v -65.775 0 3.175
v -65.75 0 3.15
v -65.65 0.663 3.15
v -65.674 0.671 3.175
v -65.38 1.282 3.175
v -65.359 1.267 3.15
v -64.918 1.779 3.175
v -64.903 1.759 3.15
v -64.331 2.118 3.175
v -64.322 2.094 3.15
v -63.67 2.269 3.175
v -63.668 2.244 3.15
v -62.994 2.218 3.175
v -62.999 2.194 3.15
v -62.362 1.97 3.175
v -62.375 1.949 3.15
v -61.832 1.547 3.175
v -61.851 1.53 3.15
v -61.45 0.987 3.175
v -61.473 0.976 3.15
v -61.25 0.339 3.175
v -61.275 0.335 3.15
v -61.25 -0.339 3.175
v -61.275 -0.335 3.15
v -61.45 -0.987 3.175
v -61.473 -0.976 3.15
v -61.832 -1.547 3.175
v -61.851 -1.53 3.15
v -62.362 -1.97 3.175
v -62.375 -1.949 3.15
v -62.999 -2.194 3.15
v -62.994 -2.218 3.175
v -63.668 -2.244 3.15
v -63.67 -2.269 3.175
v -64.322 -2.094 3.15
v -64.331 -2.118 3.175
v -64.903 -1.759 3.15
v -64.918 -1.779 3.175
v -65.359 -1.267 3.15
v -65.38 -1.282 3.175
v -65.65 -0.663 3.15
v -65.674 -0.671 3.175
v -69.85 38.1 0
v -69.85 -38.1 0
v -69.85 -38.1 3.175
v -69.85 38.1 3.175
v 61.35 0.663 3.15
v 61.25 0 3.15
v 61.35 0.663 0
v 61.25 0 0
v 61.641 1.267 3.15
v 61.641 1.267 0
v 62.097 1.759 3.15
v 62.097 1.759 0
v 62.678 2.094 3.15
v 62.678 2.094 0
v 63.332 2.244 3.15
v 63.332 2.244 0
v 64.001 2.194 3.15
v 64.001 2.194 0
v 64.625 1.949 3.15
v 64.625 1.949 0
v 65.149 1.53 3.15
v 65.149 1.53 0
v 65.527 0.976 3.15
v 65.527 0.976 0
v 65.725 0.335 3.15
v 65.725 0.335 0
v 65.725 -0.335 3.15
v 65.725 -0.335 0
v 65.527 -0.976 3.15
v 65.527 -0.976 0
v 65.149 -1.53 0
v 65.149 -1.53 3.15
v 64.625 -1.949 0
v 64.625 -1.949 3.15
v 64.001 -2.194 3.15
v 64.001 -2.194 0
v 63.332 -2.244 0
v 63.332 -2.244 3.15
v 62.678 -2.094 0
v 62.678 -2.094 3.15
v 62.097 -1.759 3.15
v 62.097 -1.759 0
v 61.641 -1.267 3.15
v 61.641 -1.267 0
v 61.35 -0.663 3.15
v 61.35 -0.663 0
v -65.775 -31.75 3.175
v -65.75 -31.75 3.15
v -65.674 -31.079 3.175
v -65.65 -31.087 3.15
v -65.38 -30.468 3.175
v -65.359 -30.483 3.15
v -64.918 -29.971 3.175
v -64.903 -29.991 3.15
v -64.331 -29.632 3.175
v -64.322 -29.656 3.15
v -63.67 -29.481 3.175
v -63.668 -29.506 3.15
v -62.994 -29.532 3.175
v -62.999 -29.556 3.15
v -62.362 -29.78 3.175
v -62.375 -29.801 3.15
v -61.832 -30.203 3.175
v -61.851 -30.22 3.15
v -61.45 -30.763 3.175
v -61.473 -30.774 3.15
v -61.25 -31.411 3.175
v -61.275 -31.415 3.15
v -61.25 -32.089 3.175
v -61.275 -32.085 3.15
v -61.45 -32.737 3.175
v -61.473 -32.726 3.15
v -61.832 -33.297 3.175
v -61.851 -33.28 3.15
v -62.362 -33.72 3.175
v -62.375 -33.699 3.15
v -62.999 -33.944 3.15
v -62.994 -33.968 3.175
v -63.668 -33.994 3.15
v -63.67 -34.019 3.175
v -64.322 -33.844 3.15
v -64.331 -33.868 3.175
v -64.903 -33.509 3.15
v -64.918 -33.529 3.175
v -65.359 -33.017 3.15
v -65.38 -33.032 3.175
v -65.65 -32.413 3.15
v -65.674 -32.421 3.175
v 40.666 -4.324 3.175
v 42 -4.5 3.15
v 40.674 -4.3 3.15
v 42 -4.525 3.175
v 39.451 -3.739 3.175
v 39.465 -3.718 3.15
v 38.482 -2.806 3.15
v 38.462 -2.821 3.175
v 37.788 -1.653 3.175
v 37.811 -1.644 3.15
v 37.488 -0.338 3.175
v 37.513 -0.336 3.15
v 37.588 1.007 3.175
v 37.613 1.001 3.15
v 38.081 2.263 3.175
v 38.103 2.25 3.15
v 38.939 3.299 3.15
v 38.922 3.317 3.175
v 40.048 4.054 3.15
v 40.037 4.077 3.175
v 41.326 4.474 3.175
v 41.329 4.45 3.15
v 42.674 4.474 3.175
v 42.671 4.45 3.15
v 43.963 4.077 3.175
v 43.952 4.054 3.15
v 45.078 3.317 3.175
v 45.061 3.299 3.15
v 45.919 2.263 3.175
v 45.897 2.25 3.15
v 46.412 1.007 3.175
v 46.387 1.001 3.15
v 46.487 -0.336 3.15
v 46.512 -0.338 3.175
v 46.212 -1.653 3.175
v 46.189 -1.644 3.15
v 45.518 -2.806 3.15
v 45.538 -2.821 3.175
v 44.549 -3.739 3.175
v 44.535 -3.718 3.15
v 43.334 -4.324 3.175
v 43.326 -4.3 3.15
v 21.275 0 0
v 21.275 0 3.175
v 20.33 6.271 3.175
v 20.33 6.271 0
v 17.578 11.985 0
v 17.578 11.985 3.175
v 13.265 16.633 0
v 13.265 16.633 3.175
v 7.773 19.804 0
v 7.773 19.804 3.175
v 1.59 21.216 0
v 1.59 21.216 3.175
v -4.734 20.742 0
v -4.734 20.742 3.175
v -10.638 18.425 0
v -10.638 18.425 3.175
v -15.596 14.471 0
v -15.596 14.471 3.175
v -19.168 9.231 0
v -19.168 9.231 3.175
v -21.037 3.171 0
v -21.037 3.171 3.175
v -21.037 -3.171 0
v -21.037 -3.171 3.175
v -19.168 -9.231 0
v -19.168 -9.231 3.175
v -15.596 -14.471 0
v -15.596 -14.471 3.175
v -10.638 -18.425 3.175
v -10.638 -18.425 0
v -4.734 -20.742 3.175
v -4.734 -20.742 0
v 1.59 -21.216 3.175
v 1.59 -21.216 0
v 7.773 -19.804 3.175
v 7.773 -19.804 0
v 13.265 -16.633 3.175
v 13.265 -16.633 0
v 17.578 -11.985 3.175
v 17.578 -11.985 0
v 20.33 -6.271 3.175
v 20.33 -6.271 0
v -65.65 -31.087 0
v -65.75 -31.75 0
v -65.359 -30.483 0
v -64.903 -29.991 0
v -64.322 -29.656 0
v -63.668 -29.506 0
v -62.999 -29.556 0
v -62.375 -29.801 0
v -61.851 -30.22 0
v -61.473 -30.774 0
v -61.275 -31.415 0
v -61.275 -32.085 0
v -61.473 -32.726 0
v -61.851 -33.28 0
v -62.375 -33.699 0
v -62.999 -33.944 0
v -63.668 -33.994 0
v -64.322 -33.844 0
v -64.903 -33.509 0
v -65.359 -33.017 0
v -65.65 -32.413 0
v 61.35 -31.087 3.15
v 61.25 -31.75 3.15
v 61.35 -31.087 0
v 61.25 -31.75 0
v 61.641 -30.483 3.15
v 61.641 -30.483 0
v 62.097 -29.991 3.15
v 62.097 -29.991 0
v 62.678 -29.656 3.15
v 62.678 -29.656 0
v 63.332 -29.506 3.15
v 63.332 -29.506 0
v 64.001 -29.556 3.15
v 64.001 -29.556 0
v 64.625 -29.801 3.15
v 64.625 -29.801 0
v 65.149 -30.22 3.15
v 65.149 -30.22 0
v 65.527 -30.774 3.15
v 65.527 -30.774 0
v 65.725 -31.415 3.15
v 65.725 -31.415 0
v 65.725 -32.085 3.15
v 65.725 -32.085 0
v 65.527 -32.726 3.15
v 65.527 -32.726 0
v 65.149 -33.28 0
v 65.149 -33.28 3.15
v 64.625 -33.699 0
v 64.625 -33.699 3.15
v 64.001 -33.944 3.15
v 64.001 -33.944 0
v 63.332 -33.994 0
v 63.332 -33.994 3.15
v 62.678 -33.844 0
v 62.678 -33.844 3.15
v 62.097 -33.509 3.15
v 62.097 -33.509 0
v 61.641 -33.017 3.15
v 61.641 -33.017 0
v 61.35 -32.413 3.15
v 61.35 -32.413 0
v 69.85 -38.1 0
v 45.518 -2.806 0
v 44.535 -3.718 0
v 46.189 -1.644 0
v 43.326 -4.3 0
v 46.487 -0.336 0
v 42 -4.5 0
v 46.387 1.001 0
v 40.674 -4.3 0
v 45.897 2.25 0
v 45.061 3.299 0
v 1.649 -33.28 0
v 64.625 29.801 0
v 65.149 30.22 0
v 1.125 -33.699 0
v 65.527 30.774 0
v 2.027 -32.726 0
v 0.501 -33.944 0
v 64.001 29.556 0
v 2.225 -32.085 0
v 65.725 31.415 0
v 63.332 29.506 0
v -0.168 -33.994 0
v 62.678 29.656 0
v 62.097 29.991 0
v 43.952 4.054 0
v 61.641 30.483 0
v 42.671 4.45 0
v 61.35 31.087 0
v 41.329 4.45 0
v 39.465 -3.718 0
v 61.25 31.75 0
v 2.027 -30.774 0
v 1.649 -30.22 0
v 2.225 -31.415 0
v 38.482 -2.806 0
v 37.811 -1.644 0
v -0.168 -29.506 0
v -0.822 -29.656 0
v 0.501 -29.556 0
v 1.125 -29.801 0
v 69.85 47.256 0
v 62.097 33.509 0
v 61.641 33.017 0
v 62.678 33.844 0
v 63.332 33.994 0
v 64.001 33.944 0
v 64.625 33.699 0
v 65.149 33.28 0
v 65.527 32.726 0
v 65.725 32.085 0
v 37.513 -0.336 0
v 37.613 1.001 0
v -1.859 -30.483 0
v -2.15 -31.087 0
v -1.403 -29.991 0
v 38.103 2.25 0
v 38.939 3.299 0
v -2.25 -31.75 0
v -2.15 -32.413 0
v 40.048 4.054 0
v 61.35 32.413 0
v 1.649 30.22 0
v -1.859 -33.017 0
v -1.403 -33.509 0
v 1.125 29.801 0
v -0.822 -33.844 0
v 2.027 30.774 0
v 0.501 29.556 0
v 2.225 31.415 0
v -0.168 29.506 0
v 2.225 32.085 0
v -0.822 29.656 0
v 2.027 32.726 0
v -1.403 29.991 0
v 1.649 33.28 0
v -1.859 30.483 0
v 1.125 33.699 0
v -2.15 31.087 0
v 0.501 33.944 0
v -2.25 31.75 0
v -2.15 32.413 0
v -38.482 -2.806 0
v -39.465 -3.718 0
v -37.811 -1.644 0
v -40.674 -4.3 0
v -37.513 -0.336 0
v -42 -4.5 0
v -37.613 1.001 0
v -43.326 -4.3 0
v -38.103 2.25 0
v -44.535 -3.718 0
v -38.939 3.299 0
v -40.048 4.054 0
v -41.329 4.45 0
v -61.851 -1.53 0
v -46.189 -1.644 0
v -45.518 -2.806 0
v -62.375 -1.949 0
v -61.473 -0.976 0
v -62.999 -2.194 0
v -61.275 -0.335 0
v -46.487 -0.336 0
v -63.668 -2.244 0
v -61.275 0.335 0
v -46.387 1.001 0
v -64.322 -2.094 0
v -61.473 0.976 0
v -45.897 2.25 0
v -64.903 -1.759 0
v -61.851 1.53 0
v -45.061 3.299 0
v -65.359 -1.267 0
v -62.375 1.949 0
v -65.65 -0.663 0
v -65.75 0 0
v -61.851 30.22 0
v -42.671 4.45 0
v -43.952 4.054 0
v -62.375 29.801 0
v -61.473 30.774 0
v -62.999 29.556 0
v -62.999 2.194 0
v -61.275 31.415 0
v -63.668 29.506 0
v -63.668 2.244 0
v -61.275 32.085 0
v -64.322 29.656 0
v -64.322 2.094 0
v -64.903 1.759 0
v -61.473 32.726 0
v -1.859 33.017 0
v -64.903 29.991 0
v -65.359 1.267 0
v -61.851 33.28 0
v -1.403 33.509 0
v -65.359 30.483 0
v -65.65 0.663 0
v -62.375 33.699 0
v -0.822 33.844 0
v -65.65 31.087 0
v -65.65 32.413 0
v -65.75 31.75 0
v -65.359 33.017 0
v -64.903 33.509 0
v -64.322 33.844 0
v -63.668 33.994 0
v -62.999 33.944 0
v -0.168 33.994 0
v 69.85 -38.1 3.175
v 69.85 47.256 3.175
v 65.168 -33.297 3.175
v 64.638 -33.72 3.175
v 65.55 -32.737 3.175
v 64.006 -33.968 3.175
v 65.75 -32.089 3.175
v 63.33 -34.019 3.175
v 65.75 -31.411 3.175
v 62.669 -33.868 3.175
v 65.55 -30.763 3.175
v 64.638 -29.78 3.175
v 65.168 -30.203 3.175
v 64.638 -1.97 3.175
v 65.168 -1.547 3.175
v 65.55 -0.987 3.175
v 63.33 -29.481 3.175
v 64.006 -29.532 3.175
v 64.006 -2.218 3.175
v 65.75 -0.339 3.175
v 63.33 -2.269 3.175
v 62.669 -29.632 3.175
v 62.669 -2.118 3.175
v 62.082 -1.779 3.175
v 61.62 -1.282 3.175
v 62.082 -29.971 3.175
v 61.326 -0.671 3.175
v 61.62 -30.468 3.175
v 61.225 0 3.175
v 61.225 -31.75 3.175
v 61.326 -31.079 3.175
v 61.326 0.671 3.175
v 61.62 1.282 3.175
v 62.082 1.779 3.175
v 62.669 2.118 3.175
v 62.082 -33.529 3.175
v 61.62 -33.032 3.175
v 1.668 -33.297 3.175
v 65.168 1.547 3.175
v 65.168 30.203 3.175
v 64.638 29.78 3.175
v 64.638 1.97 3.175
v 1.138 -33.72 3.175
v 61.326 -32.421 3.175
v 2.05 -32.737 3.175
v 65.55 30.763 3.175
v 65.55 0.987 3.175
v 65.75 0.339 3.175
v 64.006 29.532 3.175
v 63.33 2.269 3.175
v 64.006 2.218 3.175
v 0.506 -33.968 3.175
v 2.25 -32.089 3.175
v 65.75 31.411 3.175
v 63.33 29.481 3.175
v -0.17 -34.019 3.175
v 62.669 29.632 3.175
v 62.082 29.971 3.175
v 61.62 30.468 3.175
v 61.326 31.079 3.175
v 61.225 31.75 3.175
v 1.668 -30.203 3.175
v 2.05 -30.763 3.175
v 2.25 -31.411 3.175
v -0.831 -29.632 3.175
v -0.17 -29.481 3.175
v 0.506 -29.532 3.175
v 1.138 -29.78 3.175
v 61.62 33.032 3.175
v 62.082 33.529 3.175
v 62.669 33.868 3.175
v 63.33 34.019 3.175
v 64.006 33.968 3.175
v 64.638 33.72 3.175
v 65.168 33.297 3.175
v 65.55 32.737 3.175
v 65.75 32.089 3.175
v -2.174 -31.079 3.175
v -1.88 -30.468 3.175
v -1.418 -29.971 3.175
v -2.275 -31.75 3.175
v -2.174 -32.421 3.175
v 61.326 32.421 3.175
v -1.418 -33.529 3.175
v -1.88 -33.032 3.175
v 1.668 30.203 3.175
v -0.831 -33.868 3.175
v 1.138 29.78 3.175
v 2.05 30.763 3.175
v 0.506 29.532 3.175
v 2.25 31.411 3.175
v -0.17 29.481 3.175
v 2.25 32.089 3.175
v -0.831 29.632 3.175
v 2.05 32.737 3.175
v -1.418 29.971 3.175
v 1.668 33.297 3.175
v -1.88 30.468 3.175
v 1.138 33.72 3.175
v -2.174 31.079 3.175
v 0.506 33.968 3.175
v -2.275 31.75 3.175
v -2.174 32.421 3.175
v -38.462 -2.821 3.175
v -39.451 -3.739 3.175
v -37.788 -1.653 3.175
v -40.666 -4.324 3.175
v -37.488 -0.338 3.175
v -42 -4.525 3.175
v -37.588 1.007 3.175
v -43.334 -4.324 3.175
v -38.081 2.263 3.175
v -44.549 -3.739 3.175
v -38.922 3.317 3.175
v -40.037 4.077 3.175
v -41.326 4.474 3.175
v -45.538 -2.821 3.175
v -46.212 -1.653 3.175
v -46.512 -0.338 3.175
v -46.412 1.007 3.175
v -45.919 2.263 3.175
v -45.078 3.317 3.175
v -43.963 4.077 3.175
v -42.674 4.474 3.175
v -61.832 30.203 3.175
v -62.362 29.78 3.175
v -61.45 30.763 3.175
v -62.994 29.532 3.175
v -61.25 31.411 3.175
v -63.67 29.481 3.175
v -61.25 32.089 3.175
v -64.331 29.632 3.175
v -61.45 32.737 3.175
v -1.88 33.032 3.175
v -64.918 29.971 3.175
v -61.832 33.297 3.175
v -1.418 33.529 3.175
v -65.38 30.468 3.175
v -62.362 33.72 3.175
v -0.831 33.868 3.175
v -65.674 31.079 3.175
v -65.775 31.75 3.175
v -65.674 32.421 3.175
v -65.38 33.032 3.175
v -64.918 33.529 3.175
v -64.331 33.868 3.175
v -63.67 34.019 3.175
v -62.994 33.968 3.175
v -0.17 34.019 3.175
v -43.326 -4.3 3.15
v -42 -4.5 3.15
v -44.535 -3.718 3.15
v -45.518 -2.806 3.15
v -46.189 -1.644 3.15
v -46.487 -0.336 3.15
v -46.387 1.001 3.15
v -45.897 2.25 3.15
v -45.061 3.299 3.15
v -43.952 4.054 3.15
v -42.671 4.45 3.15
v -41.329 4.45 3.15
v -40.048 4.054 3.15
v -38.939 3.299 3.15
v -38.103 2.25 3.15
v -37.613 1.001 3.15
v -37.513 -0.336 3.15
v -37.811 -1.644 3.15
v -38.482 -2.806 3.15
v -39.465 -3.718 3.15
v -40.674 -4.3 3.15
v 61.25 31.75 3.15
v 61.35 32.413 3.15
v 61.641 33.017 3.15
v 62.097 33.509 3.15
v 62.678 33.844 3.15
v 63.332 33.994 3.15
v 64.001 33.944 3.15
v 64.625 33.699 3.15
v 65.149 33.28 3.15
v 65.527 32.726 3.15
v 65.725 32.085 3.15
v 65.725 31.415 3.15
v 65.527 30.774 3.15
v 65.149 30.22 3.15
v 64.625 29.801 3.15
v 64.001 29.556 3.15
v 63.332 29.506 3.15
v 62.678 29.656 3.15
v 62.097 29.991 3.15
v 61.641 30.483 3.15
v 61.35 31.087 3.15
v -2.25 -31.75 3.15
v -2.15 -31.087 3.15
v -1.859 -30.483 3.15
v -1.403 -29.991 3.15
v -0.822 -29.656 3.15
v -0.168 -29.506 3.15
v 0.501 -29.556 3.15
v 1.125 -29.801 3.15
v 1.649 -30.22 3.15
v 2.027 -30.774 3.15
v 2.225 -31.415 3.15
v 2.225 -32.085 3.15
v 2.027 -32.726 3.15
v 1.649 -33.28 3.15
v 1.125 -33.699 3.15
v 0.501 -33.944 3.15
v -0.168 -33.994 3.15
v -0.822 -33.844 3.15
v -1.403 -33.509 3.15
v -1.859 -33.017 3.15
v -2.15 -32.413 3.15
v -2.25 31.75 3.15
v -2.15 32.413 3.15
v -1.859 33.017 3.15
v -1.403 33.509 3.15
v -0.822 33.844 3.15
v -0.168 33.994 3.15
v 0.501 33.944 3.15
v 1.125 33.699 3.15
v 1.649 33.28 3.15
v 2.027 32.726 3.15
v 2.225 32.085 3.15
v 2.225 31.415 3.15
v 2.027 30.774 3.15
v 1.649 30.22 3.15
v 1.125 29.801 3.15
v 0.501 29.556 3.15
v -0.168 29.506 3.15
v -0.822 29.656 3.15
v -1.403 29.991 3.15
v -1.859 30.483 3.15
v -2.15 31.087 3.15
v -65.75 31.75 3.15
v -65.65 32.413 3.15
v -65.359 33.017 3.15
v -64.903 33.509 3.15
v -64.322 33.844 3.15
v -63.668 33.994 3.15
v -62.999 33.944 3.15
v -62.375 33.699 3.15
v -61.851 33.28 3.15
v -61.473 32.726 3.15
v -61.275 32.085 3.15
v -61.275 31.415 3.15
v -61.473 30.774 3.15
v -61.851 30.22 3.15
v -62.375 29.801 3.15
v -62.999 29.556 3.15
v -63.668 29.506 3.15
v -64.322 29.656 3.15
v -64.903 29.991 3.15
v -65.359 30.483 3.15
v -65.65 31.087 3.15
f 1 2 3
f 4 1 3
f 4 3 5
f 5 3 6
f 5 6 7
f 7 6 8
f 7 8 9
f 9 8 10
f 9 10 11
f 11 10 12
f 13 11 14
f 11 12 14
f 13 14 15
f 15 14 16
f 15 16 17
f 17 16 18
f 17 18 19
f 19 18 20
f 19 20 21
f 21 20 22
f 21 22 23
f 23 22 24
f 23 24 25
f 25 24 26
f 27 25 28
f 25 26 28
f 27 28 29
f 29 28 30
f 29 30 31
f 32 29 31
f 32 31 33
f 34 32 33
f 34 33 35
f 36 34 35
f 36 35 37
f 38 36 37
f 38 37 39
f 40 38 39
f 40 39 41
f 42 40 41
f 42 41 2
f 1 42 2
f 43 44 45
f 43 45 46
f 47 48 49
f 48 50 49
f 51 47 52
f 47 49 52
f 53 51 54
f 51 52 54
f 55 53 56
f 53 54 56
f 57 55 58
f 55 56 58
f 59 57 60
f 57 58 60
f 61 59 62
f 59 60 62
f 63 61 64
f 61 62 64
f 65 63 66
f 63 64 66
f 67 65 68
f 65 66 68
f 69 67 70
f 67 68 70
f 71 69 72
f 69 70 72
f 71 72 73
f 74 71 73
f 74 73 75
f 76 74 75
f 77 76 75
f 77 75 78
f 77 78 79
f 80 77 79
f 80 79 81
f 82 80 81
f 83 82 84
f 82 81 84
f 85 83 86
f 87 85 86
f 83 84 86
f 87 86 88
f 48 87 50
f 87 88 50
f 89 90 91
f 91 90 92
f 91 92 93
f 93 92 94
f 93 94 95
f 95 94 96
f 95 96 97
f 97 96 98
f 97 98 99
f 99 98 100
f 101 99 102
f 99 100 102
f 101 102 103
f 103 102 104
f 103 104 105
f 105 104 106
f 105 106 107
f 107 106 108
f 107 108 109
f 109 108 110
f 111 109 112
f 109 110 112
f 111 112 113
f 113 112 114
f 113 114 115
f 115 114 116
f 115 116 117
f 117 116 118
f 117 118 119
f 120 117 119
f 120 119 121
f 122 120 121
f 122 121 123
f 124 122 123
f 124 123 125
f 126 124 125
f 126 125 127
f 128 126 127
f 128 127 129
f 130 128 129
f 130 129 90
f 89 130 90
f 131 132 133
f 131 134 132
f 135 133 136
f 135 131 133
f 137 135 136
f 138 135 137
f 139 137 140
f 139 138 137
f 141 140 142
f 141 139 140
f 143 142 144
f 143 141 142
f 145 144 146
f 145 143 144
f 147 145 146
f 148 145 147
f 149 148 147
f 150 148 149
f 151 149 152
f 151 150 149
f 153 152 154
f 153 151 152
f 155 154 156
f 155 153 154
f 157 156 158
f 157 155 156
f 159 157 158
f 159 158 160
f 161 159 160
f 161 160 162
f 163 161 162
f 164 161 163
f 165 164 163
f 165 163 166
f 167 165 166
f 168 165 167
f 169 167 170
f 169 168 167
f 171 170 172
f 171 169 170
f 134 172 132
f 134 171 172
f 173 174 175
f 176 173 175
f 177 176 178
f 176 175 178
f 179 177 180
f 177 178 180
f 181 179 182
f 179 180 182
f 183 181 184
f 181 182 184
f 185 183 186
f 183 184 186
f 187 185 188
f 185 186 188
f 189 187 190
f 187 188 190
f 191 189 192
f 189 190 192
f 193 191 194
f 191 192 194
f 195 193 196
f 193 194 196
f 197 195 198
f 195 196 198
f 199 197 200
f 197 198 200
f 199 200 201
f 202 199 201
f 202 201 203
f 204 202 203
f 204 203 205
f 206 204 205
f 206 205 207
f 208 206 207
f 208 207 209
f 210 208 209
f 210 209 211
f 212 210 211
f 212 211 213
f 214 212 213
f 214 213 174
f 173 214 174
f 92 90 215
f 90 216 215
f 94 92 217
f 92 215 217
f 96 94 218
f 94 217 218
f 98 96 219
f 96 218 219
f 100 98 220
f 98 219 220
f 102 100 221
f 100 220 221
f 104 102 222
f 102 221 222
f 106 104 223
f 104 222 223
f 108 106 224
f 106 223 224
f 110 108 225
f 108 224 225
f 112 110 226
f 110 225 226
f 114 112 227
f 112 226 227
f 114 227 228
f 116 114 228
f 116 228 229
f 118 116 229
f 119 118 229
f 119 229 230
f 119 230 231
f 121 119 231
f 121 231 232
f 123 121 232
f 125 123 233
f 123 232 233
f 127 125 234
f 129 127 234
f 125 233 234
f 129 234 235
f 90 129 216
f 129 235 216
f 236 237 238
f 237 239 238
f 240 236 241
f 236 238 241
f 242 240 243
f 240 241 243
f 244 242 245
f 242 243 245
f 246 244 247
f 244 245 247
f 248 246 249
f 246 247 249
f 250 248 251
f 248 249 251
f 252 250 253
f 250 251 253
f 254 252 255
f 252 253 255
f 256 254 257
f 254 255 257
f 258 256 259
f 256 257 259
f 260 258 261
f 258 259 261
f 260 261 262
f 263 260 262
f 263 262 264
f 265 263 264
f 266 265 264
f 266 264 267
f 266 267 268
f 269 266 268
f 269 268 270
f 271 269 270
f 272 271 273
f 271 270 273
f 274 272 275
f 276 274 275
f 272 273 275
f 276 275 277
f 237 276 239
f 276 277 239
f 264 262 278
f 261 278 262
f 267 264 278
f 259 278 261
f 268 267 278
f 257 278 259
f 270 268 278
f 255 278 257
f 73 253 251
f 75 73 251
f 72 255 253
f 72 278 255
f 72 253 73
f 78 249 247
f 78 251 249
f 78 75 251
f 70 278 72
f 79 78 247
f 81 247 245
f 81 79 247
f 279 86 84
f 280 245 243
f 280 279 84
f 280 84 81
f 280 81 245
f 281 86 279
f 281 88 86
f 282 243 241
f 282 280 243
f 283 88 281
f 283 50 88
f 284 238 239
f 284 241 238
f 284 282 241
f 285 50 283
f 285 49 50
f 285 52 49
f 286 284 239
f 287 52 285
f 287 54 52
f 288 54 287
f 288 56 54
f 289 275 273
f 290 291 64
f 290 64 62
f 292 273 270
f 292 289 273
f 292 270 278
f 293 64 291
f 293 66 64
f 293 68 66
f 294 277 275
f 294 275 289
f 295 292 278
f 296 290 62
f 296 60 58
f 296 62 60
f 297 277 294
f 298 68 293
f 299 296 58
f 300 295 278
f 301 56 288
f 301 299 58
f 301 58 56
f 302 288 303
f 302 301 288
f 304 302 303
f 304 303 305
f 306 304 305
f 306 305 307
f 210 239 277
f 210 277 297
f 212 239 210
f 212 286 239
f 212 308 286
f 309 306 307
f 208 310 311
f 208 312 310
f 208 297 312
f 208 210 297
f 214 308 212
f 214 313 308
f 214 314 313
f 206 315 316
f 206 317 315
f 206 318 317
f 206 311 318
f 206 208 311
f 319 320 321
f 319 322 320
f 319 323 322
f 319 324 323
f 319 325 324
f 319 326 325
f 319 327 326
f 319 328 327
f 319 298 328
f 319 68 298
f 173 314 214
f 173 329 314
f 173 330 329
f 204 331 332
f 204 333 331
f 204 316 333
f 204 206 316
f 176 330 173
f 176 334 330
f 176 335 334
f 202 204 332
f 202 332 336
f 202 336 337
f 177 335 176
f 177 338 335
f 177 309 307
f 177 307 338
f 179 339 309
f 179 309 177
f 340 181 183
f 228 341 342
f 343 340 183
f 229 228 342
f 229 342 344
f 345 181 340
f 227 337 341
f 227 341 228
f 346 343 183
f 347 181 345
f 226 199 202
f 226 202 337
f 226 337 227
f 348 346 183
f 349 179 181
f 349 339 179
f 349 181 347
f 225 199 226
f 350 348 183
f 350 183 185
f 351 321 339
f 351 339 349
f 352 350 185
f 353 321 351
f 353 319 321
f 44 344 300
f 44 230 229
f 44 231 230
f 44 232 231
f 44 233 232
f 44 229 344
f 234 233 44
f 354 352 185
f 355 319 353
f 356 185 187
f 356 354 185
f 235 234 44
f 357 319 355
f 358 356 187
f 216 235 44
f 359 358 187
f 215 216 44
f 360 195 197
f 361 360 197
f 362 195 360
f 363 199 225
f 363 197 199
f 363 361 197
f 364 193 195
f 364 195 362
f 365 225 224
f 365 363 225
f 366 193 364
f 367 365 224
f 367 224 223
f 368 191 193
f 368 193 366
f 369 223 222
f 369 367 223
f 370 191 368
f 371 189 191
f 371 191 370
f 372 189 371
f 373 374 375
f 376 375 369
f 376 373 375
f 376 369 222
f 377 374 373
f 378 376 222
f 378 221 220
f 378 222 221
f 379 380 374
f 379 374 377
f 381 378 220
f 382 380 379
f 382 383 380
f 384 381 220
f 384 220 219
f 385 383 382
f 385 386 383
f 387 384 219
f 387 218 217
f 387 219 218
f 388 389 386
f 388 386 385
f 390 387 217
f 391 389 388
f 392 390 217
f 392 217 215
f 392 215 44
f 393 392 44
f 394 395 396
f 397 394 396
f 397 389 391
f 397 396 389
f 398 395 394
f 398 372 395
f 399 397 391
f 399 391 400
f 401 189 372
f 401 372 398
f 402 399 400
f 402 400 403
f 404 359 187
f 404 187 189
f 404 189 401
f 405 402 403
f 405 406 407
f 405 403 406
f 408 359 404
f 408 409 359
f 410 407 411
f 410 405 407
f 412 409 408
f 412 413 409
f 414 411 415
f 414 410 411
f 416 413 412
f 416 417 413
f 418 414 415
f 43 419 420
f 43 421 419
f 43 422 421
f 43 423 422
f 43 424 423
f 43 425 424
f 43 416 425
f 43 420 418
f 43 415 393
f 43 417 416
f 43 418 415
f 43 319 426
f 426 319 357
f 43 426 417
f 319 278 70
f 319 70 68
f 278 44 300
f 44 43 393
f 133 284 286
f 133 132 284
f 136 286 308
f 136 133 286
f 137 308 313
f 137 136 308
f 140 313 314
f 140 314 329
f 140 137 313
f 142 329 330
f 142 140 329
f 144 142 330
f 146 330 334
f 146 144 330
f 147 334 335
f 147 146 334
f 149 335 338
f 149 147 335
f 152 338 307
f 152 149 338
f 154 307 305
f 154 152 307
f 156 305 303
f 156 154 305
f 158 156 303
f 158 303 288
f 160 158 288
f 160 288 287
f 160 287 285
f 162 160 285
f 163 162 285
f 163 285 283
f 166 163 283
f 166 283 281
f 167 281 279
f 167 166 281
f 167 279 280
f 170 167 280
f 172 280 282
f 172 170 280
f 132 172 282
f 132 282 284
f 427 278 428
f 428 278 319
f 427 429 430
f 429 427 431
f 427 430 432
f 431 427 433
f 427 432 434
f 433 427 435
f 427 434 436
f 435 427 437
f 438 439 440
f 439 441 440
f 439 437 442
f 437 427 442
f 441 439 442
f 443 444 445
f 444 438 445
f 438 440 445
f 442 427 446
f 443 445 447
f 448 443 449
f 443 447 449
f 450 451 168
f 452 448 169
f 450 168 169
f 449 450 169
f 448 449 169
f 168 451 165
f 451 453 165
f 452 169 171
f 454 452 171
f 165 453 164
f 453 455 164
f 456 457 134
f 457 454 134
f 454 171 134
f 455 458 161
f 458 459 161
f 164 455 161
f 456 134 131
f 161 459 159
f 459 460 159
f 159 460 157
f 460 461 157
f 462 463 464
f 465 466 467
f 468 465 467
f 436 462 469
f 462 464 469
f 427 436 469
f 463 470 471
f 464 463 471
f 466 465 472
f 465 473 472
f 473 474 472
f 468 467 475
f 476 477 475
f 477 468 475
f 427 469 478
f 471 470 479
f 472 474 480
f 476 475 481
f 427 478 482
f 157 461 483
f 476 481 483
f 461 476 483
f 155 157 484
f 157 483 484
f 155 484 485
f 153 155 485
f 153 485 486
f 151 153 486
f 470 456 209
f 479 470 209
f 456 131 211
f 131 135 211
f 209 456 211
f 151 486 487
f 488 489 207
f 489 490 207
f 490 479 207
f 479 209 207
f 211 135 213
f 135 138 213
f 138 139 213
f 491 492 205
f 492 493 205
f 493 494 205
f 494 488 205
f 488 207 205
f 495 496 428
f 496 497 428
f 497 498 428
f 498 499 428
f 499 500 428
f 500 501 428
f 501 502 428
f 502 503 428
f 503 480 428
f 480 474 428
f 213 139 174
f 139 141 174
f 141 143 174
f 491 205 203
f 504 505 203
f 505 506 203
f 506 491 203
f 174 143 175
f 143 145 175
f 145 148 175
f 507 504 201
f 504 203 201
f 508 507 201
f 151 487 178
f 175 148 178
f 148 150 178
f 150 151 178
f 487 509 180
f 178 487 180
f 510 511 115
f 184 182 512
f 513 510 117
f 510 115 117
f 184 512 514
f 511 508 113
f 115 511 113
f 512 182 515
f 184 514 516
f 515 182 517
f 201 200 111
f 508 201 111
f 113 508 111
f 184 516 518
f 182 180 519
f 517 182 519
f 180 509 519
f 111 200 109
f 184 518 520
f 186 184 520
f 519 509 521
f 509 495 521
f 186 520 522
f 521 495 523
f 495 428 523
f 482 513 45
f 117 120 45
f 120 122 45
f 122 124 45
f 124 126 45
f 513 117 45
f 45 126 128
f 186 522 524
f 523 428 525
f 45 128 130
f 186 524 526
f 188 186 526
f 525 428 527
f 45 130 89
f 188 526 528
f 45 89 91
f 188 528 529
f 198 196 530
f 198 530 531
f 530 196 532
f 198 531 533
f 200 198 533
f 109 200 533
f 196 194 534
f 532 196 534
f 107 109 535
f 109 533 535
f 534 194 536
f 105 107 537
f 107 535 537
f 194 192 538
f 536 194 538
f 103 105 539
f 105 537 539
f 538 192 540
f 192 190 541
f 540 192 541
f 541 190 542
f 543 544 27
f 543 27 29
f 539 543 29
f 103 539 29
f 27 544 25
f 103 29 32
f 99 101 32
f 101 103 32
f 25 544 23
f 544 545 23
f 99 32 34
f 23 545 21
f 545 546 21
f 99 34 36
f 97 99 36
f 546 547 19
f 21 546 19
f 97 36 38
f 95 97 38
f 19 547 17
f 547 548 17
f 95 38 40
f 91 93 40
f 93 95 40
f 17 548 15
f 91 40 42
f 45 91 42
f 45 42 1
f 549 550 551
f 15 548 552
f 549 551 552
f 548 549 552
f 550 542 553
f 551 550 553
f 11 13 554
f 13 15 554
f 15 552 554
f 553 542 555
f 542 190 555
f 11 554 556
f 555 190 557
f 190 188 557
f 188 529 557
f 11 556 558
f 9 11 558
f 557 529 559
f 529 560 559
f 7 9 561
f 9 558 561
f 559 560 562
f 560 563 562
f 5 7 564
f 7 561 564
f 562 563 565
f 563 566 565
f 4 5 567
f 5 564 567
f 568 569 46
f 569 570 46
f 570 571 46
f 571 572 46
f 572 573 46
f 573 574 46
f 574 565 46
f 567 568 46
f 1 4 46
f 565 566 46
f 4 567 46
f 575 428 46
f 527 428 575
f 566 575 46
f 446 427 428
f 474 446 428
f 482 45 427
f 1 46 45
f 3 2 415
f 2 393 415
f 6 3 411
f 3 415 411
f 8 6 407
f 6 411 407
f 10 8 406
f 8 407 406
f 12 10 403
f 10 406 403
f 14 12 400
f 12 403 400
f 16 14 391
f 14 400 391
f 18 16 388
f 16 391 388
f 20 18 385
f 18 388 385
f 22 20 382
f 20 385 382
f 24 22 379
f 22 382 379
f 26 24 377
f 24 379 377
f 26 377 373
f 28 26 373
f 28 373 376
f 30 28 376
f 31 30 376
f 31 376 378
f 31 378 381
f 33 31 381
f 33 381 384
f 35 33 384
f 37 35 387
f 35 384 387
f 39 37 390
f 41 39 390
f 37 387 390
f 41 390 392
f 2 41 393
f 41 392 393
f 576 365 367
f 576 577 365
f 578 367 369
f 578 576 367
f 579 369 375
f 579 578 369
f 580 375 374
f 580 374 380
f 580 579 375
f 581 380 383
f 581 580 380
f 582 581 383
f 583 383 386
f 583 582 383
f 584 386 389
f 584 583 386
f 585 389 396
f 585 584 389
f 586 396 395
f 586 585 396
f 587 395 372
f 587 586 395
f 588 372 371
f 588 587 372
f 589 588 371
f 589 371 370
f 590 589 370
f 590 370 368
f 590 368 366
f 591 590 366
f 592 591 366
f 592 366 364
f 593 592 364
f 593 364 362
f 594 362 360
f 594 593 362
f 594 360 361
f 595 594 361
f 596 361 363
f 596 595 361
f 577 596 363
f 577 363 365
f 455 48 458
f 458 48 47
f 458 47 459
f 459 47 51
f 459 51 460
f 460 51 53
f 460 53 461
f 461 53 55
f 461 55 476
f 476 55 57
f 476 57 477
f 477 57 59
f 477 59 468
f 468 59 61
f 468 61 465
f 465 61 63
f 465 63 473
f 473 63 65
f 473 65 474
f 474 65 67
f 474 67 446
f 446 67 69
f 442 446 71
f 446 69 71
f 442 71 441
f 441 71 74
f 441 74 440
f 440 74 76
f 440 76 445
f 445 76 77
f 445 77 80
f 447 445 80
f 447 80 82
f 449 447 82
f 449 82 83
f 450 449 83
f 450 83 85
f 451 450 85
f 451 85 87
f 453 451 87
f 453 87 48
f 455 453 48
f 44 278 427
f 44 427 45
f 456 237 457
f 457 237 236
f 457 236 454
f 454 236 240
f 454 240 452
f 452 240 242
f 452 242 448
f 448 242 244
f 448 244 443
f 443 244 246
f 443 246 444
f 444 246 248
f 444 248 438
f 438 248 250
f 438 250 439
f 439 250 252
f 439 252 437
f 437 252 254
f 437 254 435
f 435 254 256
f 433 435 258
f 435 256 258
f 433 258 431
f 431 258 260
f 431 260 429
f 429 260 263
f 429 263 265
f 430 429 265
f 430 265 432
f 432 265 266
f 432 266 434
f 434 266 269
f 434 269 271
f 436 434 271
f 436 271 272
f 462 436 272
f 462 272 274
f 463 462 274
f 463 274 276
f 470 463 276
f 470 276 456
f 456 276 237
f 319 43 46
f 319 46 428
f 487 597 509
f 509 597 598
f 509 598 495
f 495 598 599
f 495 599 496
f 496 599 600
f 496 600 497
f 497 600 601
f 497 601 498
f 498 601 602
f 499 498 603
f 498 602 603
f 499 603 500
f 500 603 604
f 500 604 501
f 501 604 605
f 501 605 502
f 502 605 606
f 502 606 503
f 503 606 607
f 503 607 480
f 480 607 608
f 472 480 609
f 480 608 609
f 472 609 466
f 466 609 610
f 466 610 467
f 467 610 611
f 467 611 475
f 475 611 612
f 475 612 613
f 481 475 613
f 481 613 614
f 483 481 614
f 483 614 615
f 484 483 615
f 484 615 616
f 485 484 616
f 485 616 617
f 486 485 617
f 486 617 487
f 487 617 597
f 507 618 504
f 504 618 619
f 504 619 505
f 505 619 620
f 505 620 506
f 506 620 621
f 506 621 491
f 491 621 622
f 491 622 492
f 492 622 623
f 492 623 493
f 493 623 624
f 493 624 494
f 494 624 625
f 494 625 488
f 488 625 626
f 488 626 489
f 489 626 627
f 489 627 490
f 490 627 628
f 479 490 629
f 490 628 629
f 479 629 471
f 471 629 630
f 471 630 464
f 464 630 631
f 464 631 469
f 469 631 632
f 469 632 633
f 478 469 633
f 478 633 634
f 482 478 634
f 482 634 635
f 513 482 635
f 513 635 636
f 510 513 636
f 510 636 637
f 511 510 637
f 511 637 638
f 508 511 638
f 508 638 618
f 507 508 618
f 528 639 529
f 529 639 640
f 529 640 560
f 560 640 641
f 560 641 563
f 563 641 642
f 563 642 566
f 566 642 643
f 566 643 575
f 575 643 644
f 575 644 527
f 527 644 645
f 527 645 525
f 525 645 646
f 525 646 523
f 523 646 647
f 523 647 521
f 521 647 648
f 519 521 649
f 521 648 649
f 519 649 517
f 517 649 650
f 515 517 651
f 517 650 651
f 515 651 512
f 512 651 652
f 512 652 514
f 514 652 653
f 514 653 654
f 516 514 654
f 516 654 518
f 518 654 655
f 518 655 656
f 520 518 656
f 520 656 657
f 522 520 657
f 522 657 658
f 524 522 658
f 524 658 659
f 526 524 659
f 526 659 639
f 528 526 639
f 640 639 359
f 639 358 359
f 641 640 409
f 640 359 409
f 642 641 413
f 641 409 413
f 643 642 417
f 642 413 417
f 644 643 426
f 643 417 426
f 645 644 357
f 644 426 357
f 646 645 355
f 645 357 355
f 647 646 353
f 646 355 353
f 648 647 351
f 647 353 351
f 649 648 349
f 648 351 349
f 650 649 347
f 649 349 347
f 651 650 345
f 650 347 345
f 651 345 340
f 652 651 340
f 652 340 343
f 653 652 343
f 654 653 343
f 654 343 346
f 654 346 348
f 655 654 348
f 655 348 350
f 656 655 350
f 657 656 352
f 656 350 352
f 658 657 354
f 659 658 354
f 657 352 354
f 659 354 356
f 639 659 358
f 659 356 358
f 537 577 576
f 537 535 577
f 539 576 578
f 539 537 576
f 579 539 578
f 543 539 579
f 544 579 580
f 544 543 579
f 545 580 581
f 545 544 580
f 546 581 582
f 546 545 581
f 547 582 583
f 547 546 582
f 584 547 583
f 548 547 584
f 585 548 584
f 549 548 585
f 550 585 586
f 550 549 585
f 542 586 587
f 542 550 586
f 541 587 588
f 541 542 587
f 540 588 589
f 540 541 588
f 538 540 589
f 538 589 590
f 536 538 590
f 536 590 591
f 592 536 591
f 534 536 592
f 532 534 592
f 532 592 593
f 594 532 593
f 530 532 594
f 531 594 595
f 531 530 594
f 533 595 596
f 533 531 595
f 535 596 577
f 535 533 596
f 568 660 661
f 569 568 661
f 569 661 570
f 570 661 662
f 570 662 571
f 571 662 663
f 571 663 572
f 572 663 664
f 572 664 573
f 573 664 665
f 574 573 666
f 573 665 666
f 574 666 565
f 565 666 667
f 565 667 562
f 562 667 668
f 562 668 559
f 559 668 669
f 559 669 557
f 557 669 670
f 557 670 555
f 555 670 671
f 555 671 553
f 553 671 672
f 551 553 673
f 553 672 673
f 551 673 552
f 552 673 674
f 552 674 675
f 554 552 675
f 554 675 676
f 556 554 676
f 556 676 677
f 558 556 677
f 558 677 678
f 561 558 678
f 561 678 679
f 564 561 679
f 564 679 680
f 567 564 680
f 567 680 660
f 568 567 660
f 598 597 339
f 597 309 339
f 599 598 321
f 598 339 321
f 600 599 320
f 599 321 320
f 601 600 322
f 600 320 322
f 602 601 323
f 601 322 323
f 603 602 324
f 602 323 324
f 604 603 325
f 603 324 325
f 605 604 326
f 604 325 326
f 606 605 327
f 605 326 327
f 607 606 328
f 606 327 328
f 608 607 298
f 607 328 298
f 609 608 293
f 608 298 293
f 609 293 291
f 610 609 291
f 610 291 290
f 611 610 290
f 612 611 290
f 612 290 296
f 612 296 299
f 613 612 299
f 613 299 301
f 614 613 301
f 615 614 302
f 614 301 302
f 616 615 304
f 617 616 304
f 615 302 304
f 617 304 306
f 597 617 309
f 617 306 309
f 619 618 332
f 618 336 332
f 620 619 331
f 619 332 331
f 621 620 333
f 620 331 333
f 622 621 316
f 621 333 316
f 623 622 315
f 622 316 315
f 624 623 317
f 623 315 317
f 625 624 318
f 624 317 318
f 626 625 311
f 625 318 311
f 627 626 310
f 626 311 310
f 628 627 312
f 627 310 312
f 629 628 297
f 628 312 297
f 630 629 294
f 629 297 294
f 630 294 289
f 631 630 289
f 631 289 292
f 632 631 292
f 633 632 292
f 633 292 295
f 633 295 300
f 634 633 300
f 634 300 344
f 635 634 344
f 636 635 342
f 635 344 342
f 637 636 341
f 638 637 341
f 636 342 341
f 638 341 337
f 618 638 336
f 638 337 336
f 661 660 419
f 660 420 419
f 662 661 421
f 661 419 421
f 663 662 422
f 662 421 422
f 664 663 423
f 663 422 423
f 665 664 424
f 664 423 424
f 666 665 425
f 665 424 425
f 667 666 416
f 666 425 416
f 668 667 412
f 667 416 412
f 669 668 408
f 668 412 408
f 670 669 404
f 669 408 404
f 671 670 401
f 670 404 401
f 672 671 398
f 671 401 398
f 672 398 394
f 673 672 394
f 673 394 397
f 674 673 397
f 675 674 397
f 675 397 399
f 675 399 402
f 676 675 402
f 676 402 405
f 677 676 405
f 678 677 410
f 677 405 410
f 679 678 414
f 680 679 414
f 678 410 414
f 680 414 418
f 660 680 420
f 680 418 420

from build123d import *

# Parameters (mm, degrees)
BOSS_EXTRUDE1_DEPTH            = 3.175
M4_CLEARANCE_HOLE1_D           = 4.5
M4_CLEARANCE_HOLE1_CSINK_D     = 4.55
M4_CLEARANCE_HOLE1_CSINK_ANGLE = 90
M8_CLEARANCE_HOLE1_AT_2_COUNT  = 2
M8_CLEARANCE_HOLE1_AT_2_PITCH  = 84
SKETCH9_R                      = 21.275
CENTER_HOLE_DEPTH              = 85.39355735


with BuildPart() as part:
    # Sketch1 → Boss-Extrude1 (new body)
    with BuildSketch(Plane.XY):
        Polygon((-69.85, 38.1), (69.85, 47.256421755), (69.85, 38.1), (69.85, -38.1), (-69.85, -38.1), align=None)
    extrude(amount=BOSS_EXTRUDE1_DEPTH)

    # M4 Clearance Hole1 (through all)
    with Locations(Plane.XY.offset(3.175)):
        with Locations((-63.5, -31.75), (0, -31.75), (63.5, -31.75), (63.5, 31.75), (63.5, 0), (0, 31.75), (-63.5, 31.75), (-63.5, 0)):
            CounterSinkHole(M4_CLEARANCE_HOLE1_D / 2, M4_CLEARANCE_HOLE1_CSINK_D / 2, counter_sink_angle=M4_CLEARANCE_HOLE1_CSINK_ANGLE)

    # Sketch11 → M8 Clearance Hole1 (revolve, cut)
    with BuildSketch(Plane(origin=(-42, 0, 3.175), x_dir=(0, -1, 0), z_dir=(1, 0, 0))):
        Polygon((0, 0), (0, 3.175), (4.5, 3.175), (4.5, 0.025), (4.525, 0), align=None)
    m8_clearance_hole1 = revolve(axis=Axis((-42, 0, 9.525), (0, 0, -1)), mode=Mode.SUBTRACT)

    # M8 Clearance Hole1 at 2: M8 Clearance Hole1 ×2
    with Locations(*[(i * M8_CLEARANCE_HOLE1_AT_2_PITCH, 0, 0) for i in range(1, M8_CLEARANCE_HOLE1_AT_2_COUNT)]):
        add(m8_clearance_hole1, mode=Mode.SUBTRACT)

    # Sketch9 → Center Hole (cut, through all)
    with BuildSketch(Plane.XY.offset(3.175)):
        Circle(SKETCH9_R)
    extrude(amount=-CENTER_HOLE_DEPTH, mode=Mode.SUBTRACT)


solid = part.part
